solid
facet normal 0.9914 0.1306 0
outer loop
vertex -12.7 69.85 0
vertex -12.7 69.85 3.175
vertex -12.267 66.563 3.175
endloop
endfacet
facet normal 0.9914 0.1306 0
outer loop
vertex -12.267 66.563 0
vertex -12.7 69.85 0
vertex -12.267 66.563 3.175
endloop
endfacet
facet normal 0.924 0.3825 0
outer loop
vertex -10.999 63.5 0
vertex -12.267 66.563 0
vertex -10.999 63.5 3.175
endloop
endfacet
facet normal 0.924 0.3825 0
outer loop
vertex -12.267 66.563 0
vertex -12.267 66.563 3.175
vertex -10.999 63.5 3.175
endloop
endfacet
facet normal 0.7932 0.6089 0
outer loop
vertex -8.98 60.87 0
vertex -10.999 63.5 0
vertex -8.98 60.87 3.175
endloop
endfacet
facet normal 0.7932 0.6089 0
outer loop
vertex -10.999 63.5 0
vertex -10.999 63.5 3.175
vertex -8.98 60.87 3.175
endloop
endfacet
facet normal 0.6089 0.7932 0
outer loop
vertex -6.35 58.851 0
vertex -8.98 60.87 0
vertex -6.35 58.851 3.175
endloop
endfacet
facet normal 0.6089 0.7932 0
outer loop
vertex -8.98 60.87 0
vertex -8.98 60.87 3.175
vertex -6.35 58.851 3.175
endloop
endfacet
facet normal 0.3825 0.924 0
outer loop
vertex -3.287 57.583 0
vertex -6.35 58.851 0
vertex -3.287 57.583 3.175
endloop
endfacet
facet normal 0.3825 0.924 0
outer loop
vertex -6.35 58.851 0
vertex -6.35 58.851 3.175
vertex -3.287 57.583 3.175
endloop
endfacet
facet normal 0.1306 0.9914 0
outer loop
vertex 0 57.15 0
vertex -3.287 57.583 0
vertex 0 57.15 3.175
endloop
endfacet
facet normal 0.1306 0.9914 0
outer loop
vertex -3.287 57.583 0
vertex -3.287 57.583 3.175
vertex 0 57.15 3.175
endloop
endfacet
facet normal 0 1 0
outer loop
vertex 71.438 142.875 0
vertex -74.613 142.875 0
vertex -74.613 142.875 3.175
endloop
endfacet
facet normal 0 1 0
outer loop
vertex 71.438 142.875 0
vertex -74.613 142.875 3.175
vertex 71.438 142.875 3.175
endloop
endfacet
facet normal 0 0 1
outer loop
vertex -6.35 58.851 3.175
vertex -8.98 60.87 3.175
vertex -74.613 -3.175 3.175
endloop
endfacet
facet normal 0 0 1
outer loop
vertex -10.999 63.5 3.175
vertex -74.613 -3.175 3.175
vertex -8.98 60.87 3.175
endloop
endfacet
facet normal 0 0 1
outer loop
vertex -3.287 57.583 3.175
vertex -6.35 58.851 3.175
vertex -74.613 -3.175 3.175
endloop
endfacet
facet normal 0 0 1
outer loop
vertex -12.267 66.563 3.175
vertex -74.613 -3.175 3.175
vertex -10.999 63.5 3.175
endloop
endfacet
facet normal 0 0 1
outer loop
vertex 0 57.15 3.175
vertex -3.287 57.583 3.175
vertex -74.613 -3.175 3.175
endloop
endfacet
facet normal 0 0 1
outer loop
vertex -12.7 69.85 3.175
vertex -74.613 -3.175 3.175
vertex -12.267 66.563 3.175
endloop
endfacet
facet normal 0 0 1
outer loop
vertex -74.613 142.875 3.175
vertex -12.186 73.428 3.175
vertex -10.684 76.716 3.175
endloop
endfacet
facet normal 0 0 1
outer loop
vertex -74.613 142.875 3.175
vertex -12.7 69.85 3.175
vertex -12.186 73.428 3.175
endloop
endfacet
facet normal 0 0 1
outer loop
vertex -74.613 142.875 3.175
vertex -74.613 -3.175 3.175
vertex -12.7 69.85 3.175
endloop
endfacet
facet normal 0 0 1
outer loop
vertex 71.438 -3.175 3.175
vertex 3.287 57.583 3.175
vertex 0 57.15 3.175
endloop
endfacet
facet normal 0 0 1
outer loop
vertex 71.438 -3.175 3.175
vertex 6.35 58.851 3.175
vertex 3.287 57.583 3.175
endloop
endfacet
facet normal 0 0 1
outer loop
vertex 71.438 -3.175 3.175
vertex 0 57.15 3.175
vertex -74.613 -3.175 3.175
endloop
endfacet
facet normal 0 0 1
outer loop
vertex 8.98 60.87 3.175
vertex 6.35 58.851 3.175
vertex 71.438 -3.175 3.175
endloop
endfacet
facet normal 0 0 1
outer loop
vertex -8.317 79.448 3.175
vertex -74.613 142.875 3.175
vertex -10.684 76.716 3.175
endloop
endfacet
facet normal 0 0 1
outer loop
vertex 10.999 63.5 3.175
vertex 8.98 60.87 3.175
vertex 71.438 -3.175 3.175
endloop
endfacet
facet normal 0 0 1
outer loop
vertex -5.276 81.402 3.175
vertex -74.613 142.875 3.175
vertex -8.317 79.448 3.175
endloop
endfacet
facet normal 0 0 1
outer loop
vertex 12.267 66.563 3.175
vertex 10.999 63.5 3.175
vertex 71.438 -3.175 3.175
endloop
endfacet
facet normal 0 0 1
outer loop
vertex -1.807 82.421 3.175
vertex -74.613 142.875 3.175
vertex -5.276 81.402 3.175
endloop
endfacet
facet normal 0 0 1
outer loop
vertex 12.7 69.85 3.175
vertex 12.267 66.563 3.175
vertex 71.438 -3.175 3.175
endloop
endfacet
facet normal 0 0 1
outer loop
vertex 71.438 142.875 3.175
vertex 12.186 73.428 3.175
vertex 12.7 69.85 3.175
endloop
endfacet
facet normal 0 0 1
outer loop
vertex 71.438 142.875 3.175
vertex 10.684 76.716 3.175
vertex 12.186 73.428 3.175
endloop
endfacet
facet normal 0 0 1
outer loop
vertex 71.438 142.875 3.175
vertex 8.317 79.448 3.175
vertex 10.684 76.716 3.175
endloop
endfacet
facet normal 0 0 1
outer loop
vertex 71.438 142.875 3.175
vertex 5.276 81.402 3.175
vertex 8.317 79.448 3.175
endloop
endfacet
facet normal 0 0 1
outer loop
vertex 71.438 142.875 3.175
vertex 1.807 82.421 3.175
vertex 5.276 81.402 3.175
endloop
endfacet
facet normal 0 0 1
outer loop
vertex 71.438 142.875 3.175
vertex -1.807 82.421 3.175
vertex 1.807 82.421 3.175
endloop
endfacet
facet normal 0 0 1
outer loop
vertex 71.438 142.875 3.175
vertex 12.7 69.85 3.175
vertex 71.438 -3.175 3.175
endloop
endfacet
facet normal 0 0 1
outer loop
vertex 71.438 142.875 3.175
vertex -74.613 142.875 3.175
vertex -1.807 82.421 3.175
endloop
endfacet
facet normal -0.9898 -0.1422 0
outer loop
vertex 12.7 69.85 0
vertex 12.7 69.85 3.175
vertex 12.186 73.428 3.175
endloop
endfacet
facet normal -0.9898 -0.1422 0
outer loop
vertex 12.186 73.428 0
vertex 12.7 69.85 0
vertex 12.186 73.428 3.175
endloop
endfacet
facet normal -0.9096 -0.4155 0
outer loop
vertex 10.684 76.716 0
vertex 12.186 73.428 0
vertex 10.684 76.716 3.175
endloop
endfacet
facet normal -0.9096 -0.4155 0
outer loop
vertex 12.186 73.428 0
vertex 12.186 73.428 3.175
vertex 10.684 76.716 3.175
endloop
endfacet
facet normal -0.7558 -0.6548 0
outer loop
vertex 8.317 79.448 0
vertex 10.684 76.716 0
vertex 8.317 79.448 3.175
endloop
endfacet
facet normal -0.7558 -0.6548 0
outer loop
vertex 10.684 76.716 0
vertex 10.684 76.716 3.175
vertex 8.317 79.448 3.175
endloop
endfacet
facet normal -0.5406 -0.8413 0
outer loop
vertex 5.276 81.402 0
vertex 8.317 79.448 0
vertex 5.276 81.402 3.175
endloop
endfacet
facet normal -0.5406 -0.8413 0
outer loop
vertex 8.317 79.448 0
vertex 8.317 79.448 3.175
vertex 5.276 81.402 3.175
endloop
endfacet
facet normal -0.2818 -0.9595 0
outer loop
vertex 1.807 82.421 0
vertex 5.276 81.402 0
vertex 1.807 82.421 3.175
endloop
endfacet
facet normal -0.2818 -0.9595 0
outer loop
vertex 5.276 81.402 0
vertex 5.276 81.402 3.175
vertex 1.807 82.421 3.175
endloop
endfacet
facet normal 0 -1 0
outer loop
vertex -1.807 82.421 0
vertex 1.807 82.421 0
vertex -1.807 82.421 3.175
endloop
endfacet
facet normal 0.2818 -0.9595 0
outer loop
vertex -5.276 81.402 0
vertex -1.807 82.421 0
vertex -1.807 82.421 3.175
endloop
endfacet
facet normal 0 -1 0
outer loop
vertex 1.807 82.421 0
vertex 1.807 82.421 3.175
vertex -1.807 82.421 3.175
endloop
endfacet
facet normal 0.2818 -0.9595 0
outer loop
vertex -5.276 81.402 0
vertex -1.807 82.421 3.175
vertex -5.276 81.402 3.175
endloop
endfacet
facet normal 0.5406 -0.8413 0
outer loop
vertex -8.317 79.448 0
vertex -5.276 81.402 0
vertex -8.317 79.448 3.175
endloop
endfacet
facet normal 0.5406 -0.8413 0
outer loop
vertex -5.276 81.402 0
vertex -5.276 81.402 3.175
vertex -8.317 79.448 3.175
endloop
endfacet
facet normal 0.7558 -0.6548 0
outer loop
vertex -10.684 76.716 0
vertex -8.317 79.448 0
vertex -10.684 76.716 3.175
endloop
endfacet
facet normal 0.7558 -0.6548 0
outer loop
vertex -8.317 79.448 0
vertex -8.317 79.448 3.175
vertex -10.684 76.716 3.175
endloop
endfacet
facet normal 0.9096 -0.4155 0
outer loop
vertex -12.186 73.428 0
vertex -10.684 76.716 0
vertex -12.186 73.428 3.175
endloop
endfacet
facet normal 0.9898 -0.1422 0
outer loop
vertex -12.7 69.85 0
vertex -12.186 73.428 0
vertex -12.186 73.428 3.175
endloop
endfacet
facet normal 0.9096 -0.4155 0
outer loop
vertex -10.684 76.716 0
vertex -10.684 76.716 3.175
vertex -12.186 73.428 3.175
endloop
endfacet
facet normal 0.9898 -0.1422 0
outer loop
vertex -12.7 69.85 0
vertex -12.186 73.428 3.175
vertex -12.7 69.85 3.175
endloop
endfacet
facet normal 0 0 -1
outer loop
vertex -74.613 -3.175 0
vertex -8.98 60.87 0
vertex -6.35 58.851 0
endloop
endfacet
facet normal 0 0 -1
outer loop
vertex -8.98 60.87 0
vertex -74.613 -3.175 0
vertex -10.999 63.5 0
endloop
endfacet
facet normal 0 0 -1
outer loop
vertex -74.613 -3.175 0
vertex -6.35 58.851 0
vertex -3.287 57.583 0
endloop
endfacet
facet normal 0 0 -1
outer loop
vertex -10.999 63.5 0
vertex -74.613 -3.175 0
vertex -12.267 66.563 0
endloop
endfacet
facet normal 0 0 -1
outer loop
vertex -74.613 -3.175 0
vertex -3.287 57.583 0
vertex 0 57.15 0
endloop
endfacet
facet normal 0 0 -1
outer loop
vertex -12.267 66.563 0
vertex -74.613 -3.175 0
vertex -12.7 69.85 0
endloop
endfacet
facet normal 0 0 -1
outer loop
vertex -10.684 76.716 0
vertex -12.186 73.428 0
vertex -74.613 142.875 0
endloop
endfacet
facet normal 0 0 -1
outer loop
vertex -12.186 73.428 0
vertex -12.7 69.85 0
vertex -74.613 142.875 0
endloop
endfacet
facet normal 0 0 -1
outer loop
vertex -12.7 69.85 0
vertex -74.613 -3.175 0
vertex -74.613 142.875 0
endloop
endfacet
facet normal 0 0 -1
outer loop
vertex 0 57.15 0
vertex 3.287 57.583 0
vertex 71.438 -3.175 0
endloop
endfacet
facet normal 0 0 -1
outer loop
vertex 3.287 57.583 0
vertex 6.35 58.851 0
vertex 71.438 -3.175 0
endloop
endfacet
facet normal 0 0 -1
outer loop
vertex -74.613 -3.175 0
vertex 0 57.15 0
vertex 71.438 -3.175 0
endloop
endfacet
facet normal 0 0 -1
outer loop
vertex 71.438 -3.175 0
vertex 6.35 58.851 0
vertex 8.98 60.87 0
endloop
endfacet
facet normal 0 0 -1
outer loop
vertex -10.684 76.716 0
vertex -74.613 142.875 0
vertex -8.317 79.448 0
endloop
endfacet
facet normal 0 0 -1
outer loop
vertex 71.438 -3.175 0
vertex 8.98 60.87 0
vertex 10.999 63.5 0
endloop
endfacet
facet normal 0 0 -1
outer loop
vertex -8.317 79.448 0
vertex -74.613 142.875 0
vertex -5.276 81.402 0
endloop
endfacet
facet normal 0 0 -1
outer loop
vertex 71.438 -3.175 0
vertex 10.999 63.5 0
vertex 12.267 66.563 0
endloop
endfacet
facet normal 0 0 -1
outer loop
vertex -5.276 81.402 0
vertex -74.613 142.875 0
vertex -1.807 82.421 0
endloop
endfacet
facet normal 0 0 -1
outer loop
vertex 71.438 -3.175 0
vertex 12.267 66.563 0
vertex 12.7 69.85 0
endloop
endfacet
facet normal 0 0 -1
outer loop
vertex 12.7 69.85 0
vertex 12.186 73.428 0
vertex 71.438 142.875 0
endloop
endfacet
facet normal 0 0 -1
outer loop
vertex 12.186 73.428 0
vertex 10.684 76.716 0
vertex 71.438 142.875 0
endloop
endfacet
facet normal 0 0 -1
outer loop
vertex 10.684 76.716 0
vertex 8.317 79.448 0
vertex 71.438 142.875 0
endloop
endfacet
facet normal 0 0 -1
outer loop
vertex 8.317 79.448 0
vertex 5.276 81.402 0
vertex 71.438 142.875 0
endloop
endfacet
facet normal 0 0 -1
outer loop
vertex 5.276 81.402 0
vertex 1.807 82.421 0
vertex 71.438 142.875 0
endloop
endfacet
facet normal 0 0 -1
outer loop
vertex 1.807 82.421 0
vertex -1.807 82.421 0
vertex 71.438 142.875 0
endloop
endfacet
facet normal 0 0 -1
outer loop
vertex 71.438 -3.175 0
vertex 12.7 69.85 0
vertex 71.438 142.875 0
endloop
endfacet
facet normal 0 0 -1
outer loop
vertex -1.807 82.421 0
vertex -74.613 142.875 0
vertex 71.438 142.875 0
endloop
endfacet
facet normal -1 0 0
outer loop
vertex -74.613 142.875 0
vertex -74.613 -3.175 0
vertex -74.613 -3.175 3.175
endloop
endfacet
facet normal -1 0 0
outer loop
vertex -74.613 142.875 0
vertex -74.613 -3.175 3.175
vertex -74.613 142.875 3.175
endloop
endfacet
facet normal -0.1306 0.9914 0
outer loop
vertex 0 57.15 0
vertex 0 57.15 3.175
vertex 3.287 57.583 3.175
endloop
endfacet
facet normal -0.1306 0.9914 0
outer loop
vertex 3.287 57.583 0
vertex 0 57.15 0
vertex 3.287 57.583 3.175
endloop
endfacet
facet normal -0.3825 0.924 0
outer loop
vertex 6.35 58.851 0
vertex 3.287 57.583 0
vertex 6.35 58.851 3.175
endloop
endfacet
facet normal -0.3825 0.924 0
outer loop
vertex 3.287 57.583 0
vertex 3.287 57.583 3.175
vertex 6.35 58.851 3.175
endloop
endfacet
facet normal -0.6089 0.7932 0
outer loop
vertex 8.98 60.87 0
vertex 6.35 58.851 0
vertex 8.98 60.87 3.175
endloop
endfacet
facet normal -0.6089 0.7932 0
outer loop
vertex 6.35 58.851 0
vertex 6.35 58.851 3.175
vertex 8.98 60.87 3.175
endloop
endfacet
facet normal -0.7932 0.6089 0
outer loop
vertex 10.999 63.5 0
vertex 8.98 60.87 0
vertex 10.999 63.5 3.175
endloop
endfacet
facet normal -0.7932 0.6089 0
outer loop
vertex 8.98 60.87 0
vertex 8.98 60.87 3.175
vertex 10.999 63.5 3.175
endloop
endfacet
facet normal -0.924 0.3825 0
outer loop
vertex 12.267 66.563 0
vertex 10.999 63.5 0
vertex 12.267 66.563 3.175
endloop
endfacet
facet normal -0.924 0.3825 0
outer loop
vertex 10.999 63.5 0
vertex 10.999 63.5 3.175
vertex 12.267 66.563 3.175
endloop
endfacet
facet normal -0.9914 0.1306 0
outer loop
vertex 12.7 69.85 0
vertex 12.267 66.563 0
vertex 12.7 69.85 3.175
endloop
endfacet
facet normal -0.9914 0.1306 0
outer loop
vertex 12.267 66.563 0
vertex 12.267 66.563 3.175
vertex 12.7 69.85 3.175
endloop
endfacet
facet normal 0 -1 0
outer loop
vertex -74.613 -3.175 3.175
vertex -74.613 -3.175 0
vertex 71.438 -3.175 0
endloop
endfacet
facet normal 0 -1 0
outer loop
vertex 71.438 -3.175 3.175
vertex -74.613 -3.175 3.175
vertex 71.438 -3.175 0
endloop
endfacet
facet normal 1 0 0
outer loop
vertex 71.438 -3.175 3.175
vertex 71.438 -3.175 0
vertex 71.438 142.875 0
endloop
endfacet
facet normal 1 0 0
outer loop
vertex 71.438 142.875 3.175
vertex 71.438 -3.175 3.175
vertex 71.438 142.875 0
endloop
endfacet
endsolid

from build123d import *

# Parameters (mm, degrees)
SKETCH1_W           = 146.05
SKETCH1_H           = 146.05
BOSS_EXTRUDE1_DEPTH = 3.175
CUT_EXTRUDE1_DEPTH  = 4.175


with BuildPart() as part:
    # Sketch1 → Boss-Extrude1 (new body)
    with BuildSketch(Plane.XY):
        with Locations((-1.5875, 69.85)):
            Rectangle(SKETCH1_W, SKETCH1_H)
    extrude(amount=BOSS_EXTRUDE1_DEPTH)

    # Sketch2 → Cut-Extrude1 (cut, through all)
    with BuildSketch(Plane.XY.offset(3.175)):
        with BuildLine():
            ThreePointArc((12.7, 69.85), (0, 82.55), (-12.7, 69.85))
            Line((-12.7, 69.85), (0, 69.85))
            Line((0, 69.85), (0, 57.15))
            ThreePointArc((0, 57.15), (8.980256121, 60.869743879), (12.7, 69.85))
        make_face()
        with BuildLine():
            Line((0, 69.85), (-12.7, 69.85))
            ThreePointArc((-12.7, 69.85), (-8.980256121, 60.869743879), (0, 57.15))
            Line((0, 57.15), (0, 69.85))
        make_face()
    extrude(amount=-CUT_EXTRUDE1_DEPTH, mode=Mode.SUBTRACT)


solid = part.part
